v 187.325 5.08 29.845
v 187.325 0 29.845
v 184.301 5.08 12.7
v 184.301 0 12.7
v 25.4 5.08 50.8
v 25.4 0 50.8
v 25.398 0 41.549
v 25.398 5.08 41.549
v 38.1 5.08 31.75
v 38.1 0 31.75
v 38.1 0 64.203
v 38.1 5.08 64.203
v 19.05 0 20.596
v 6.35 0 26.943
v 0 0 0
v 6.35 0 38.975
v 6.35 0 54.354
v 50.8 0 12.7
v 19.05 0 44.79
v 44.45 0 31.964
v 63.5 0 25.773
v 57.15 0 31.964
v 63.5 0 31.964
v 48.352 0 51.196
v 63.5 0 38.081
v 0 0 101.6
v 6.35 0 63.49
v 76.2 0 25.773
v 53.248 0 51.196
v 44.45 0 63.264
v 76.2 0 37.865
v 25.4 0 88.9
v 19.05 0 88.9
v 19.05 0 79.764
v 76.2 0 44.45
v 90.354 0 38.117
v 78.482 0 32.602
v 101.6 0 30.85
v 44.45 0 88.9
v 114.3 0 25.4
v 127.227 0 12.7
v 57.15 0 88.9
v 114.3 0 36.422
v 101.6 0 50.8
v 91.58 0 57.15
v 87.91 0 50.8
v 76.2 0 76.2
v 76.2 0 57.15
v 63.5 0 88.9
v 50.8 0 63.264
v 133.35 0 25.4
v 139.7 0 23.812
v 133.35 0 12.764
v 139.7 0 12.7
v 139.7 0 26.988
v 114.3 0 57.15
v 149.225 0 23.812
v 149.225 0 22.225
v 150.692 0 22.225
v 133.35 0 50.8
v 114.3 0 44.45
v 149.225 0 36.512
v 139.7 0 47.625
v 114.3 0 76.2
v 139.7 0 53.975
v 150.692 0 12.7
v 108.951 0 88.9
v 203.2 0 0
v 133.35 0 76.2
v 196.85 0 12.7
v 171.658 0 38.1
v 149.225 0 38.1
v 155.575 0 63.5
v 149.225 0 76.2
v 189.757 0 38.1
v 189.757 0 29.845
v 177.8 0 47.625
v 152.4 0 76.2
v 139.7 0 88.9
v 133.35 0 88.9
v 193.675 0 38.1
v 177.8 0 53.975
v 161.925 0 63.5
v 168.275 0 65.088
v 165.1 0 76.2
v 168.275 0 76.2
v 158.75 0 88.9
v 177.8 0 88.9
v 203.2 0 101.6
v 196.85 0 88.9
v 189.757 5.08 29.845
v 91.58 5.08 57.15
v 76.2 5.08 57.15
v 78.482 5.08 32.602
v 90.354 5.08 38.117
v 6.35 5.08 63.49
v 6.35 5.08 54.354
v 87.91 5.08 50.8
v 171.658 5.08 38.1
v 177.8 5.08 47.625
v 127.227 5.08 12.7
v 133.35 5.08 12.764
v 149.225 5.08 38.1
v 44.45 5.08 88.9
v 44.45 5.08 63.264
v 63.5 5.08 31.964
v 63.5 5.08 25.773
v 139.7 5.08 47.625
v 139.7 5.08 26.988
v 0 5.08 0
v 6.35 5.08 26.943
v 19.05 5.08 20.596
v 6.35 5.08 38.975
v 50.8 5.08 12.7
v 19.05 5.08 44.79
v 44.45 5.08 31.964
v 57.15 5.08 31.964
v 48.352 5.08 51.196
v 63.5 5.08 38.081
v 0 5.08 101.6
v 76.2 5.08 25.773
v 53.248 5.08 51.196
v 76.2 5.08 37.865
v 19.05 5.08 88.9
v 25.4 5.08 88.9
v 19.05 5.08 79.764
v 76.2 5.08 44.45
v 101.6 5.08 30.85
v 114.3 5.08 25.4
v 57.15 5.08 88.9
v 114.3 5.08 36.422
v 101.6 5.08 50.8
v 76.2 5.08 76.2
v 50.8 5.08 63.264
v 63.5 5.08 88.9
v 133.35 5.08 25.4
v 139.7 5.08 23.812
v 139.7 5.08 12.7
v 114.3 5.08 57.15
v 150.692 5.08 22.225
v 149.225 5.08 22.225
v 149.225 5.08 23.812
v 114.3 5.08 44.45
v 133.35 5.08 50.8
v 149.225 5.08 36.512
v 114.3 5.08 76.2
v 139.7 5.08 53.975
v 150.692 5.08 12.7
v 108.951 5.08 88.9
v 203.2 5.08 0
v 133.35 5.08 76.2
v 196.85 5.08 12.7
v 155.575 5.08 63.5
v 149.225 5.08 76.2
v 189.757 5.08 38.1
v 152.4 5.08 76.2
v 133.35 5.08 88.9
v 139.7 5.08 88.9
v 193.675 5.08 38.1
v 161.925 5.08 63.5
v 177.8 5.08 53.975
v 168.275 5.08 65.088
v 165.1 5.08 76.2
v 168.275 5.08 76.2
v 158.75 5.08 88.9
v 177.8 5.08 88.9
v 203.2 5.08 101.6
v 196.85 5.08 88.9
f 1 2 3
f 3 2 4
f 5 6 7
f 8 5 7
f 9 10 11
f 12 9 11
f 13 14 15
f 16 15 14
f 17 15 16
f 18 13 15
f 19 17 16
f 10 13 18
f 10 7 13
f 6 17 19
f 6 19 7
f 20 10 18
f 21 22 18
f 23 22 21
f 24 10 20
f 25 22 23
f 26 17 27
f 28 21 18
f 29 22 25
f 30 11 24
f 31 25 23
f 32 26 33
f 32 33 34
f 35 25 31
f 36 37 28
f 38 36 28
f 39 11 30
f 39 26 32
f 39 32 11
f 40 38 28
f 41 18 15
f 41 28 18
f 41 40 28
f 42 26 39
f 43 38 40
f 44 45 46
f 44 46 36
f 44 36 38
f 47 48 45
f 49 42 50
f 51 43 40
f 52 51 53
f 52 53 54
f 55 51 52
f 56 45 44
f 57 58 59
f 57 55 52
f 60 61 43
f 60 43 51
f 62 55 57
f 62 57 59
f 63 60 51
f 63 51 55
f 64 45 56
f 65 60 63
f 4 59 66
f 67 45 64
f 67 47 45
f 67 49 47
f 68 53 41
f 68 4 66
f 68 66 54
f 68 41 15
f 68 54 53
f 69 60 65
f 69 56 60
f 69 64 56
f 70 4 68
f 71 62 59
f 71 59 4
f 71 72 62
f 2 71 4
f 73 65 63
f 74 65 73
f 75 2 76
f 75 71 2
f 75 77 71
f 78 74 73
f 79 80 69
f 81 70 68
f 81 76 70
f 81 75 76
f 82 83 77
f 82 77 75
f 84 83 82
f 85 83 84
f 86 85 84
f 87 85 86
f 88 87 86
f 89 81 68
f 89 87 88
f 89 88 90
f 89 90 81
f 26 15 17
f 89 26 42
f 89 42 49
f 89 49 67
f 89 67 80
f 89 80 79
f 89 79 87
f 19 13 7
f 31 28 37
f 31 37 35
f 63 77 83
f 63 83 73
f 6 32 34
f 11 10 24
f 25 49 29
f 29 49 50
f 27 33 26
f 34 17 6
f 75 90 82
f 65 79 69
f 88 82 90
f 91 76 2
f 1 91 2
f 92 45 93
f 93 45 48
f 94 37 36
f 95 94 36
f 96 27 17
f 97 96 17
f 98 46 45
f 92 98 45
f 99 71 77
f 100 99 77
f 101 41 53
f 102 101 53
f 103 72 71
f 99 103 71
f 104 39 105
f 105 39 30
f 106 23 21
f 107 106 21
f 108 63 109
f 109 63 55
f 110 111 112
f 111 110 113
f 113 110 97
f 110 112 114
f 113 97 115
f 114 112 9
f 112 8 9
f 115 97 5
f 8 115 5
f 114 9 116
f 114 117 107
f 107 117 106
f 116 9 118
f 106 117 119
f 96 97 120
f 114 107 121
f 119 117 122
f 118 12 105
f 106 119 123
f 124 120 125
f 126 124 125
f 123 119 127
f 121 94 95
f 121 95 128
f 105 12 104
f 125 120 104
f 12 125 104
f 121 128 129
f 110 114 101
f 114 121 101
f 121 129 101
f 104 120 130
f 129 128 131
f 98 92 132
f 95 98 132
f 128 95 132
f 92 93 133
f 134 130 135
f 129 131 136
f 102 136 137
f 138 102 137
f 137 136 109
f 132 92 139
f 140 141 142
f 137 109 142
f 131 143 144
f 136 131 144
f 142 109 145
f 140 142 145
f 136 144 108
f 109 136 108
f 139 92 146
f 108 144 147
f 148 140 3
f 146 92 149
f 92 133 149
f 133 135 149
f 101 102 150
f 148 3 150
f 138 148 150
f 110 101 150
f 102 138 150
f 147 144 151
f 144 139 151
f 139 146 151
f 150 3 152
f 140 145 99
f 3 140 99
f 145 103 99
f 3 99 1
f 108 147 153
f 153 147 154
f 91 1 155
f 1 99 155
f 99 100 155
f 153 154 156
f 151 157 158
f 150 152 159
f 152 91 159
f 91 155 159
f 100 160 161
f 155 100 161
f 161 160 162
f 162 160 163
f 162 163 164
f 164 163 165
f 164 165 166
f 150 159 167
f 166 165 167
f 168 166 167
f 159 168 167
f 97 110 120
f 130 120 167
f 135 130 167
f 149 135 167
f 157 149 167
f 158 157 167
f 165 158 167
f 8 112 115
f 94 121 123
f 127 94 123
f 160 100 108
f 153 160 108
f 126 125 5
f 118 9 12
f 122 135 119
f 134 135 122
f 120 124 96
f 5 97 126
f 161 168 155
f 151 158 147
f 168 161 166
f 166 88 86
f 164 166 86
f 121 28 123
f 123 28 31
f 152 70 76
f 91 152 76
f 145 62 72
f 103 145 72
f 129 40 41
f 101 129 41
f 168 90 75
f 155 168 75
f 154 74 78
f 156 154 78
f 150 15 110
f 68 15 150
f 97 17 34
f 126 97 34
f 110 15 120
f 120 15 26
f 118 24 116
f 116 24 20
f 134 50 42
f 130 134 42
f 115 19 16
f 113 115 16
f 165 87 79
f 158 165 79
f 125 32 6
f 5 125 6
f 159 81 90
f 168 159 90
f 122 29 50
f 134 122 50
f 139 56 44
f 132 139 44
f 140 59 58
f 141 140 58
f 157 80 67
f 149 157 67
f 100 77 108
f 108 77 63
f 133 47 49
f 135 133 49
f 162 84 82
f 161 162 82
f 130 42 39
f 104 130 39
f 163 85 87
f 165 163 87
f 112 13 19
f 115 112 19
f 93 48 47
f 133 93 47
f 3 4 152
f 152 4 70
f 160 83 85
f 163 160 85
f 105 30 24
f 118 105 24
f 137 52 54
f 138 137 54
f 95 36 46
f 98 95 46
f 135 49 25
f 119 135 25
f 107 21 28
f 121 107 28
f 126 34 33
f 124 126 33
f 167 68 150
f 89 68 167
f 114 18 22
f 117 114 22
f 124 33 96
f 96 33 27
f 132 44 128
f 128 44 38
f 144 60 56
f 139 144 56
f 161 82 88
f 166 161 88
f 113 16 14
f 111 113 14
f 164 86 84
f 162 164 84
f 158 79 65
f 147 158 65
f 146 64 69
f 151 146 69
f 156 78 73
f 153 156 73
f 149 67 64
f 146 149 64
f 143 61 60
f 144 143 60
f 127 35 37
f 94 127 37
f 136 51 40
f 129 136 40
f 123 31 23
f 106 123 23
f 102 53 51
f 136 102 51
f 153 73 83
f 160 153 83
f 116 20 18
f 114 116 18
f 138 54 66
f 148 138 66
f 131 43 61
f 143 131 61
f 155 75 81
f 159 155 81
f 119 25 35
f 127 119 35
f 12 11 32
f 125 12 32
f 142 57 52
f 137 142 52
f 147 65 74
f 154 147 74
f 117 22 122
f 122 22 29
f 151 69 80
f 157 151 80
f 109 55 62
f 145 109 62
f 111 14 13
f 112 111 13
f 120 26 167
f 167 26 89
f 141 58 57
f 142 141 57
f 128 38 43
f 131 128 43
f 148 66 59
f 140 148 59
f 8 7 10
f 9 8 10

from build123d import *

# Parameters (mm, degrees)
F1_W     = 203.2
F1_H     = 101.6
F2_DEPTH = 5.08
F5_DEPTH = 25.4


with BuildPart() as f2:
    # F1 (on Front) → F2 (new body)
    with BuildSketch(Plane.XZ):
        with Locations((101.6, 50.8)):
            Rectangle(F1_W, F1_H)
    extrude(amount=-F2_DEPTH)

    # F4 (on face) → F5 (cut)
    with BuildSketch(Plane.XZ):
        Polygon((19.05, 88.9), (6.35, 63.4896950778), (6.35, 54.3535576701), (19.05, 79.7638625923), align=None)
        Polygon((19.05, 44.7899766155), (6.35, 38.9748217106), (6.35, 26.9433392146), (19.05, 20.5959144004), (19.05, 31.75), align=None)
        Polygon((25.4, 64.1602875233), (25.4, 50.8), (25.3980111729, 41.5485496718), (38.1, 31.75), (38.1, 50.8), (38.1, 64.1602875233), align=None)
        Polygon((25.4, 88.9), (25.4, 64.1602875233), (38.1, 64.1602875233), (38.1, 64.2026114812), align=None)
        Polygon((57.15, 88.9), (44.45, 88.9), (44.45, 63.2637151304), (48.3517487947, 51.1962487751), (44.45, 31.964471331), (50.8, 12.7), (57.15, 31.964471331), (53.2482512053, 51.1962487751), (50.8, 63.2637151304), align=None)
        Polygon((76.2, 76.2), (63.5, 88.9), (63.5, 38.0811007293), (76.2, 44.45), (78.4824932634, 32.6018280187), (90.3535660462, 38.1168511729), (87.9102185152, 50.8), (91.5801092576, 57.15), (76.2, 57.15), align=None)
        Polygon((76.2, 37.8645947099), (63.5, 31.964471331), (63.5, 25.7733563287), (76.2, 25.7733563287), align=None)
        Polygon((133.35, 50.8), (114.3, 57.15), (101.6, 50.8), (114.3, 44.45), align=None)
        Polygon((114.3, 44.45), (101.6, 50.8), (101.6, 30.8501303583), (114.3, 36.4221383274), align=None)
        Polygon((108.9507660084, 88.9), (114.3, 76.2), (133.35, 76.2), (133.35, 88.9), align=None)
        Polygon((133.35, 25.4), (114.3, 25.4), (127.2270479083, 12.7), (133.35, 12.7643318847), align=None)
        Polygon((149.225, 76.2), (152.4, 76.2), (158.75, 88.9), (139.7, 88.9), (139.7, 53.975), align=None)
        Polygon((158.75, 88.9), (152.4, 76.2), (155.575, 63.5), (161.925, 63.5), (165.1, 76.2), align=None)
        Polygon((177.8, 53.975), (177.8, 88.9), (168.275, 76.2), (168.275, 65.0875), align=None)
        Polygon((177.8, 47.625), (139.7, 47.625), (139.7, 26.9875), (149.225, 36.5125), (149.225, 38.1), (171.658446914, 38.1), align=None)
        Polygon((149.225, 23.8125), (139.7, 23.8125), (139.7, 12.7), (150.6915916045, 12.7), (150.6915916045, 22.225), (149.225, 22.225), align=None)
        Polygon((196.85, 88.9), (189.7574476064, 38.1), (193.675, 38.1), align=None)
        Polygon((196.85, 12.7), (189.7574476064, 29.845), (187.325, 29.845), (184.3011081219, 12.7), align=None)
    extrude(amount=-F5_DEPTH, mode=Mode.SUBTRACT)


solid = f2.part
